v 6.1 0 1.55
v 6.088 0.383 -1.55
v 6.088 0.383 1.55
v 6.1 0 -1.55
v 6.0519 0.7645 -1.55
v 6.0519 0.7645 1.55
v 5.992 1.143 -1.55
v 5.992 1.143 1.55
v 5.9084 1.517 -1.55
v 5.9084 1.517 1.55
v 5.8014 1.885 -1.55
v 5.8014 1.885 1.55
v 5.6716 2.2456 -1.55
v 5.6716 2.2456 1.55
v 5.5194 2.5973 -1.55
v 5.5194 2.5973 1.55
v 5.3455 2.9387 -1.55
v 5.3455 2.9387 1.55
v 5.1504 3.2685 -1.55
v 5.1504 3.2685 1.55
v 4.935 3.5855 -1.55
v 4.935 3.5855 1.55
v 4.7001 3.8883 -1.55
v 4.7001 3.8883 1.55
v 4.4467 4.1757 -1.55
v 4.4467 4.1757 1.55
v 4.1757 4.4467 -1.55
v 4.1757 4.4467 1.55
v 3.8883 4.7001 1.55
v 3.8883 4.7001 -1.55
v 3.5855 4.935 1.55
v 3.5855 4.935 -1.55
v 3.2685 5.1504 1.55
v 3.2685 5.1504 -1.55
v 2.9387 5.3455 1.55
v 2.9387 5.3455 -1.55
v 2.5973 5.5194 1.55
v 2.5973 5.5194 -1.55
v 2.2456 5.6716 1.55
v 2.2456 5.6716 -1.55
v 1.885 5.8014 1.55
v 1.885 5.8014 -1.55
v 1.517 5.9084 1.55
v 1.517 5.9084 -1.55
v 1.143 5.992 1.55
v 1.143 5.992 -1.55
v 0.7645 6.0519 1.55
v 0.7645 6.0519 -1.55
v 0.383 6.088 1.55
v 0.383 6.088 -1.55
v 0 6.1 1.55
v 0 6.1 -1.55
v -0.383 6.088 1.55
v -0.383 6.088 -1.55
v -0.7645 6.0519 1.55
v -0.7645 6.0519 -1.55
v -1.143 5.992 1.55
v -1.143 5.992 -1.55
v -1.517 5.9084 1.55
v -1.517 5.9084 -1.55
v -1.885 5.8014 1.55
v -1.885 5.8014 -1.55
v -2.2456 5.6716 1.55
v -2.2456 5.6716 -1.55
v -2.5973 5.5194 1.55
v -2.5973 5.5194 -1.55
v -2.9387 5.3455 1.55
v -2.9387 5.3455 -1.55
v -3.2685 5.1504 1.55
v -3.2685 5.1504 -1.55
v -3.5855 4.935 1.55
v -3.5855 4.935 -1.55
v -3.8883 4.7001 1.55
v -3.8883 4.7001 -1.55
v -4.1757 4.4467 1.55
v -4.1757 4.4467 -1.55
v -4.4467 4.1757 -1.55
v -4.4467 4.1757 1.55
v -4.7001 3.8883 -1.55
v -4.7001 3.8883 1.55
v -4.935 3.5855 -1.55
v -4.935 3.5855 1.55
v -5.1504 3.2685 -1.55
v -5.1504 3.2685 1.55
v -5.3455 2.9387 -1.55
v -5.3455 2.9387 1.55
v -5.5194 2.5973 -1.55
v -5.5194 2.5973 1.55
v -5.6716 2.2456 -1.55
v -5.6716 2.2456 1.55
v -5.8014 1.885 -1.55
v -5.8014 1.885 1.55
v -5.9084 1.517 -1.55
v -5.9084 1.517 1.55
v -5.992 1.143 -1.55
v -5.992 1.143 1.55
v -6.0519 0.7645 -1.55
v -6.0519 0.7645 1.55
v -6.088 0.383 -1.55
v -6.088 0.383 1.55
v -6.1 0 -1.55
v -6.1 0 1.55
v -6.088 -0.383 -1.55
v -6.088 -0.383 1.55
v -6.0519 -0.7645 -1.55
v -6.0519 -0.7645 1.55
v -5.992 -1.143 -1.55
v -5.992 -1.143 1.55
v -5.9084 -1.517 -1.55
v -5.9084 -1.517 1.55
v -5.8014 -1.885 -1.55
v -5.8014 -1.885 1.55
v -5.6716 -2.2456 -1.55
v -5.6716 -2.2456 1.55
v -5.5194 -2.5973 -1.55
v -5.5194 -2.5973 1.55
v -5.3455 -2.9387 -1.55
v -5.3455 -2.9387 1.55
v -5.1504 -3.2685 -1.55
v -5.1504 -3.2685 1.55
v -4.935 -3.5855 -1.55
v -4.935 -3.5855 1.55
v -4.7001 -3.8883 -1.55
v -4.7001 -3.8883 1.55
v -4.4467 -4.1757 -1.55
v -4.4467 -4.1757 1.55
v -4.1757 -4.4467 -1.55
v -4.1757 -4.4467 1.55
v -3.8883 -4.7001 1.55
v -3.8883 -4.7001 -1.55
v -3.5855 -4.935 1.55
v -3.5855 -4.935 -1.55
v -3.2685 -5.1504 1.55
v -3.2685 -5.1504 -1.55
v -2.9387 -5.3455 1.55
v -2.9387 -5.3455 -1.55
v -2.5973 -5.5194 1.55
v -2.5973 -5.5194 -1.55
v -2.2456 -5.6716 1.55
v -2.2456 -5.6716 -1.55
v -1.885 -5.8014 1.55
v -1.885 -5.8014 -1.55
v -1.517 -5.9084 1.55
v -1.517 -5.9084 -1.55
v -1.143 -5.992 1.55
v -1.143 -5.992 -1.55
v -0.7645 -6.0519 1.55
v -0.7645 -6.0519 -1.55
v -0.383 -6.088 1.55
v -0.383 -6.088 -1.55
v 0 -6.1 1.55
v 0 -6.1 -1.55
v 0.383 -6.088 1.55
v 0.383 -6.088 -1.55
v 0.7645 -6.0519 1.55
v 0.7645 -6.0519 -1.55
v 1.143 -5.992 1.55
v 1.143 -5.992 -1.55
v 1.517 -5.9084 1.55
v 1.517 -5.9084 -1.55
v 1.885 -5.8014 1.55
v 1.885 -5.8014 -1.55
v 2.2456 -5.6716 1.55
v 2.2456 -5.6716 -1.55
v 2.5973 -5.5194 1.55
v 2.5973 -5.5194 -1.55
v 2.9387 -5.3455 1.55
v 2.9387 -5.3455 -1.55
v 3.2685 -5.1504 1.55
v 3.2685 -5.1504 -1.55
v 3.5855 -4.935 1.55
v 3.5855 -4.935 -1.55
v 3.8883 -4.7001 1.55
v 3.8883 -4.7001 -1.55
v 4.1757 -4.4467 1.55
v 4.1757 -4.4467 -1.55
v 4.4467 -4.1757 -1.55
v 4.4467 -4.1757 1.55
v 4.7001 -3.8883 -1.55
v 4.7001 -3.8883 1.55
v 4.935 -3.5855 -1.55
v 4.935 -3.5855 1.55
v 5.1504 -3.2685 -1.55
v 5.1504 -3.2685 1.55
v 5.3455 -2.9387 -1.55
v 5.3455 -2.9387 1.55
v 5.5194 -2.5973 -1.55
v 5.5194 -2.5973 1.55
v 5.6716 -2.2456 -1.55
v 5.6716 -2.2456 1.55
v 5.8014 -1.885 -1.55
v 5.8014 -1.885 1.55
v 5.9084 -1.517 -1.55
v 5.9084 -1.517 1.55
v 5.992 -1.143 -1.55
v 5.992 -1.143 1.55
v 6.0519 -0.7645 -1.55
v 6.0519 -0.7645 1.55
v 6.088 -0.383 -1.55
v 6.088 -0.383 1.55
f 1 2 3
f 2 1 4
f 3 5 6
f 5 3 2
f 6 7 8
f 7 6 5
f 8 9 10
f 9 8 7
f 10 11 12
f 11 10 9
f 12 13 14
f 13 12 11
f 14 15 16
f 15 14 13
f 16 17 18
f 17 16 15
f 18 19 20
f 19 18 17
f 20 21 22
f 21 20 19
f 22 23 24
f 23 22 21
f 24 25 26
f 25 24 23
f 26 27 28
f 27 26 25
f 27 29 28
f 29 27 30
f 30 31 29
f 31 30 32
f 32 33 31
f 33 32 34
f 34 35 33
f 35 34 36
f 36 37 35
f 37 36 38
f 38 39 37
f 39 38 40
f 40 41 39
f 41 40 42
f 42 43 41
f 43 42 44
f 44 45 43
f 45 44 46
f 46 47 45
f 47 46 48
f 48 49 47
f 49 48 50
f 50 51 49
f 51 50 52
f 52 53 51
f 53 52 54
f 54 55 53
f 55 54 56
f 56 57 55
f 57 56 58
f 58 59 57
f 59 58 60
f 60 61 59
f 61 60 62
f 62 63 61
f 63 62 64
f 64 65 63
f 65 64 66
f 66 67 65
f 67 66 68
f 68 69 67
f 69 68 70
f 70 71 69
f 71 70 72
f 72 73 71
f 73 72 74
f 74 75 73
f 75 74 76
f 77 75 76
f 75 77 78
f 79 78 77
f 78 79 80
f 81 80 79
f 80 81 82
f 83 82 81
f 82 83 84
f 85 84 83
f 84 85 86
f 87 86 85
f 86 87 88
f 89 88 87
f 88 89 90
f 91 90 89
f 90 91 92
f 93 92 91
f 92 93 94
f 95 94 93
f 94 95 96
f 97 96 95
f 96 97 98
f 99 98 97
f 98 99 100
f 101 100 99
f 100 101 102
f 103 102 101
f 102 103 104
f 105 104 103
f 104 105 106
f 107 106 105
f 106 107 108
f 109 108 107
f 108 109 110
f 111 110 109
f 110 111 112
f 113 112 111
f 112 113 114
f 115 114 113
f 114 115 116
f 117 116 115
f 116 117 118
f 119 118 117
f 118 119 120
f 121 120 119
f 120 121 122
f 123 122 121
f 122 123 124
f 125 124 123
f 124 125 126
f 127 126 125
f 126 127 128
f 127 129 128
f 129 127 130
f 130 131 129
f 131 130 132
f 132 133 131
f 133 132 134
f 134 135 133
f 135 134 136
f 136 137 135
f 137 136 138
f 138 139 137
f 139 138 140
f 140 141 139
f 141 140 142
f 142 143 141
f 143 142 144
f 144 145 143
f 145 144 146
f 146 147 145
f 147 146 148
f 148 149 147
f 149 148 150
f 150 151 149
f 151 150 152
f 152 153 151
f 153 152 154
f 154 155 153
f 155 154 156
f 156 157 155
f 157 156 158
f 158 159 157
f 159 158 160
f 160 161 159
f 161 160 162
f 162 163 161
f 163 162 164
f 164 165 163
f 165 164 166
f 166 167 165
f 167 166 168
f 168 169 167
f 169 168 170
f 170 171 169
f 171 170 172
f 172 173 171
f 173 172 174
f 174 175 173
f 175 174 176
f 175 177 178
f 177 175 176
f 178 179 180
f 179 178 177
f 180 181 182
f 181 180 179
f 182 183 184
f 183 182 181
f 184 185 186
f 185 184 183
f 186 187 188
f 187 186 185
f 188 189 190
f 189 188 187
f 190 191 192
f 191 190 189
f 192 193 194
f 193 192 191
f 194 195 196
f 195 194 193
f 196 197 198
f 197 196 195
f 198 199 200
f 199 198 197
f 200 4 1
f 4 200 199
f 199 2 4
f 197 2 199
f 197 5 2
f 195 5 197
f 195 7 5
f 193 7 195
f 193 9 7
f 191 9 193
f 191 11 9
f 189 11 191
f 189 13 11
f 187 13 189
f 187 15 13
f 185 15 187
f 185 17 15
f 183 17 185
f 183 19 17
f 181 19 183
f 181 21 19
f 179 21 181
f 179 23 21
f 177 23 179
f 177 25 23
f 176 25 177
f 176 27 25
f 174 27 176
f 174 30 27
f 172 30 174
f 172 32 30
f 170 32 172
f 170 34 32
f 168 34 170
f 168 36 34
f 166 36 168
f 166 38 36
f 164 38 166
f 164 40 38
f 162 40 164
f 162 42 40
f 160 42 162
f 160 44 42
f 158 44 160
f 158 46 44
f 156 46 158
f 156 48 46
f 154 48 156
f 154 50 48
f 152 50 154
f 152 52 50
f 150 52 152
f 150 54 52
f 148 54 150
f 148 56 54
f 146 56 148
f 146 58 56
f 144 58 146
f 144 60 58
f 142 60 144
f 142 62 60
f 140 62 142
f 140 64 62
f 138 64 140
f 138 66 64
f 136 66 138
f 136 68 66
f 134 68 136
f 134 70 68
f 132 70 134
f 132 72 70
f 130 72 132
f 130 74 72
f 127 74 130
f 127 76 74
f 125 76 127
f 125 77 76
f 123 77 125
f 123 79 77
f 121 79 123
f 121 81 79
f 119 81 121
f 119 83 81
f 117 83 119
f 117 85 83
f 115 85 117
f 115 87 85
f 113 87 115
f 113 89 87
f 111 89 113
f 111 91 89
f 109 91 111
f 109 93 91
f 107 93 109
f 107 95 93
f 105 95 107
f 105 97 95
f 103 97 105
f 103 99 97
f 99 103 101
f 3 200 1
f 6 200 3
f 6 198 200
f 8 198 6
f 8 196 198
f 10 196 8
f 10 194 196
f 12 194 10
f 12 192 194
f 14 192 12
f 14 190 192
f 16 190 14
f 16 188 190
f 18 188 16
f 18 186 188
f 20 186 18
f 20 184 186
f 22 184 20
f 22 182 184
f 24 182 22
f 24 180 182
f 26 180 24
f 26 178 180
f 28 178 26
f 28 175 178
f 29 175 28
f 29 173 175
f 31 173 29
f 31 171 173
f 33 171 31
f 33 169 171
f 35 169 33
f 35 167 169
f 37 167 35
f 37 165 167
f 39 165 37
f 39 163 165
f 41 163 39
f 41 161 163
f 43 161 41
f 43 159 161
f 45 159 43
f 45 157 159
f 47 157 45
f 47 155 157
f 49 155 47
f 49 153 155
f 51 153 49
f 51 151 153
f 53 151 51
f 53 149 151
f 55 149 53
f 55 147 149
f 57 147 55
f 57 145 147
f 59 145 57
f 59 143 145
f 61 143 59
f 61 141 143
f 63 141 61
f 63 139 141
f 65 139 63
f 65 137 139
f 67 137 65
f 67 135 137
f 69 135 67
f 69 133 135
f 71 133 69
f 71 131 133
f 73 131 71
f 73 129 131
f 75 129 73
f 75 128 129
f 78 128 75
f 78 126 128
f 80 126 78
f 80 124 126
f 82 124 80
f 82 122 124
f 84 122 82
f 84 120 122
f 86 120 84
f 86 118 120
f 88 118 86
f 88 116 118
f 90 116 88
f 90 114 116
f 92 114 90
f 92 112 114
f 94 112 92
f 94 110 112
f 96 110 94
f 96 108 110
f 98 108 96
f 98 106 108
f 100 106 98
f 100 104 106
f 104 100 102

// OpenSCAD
// file: ../../lib/connector/connector_coaxial.scad
sides = 100;

//connector_AtlasScientific_EZO(3,0.1);

module connector_AtlasScientific_EZO(depth,clear)
{
    diameter = 12;

    connector_coaxial(diameter,depth,clear);
}

module connector_coaxial(diameter,depth,clear)
{
    radius = diameter/2+clear;
    depth = depth+clear;

    cylinder(r=radius, h=depth,center=true, $fn=sides);
}
// main file
include <../../lib/connector/connector_coaxial.scad>;

connector_AtlasScientific_EZO(3,0.1);
